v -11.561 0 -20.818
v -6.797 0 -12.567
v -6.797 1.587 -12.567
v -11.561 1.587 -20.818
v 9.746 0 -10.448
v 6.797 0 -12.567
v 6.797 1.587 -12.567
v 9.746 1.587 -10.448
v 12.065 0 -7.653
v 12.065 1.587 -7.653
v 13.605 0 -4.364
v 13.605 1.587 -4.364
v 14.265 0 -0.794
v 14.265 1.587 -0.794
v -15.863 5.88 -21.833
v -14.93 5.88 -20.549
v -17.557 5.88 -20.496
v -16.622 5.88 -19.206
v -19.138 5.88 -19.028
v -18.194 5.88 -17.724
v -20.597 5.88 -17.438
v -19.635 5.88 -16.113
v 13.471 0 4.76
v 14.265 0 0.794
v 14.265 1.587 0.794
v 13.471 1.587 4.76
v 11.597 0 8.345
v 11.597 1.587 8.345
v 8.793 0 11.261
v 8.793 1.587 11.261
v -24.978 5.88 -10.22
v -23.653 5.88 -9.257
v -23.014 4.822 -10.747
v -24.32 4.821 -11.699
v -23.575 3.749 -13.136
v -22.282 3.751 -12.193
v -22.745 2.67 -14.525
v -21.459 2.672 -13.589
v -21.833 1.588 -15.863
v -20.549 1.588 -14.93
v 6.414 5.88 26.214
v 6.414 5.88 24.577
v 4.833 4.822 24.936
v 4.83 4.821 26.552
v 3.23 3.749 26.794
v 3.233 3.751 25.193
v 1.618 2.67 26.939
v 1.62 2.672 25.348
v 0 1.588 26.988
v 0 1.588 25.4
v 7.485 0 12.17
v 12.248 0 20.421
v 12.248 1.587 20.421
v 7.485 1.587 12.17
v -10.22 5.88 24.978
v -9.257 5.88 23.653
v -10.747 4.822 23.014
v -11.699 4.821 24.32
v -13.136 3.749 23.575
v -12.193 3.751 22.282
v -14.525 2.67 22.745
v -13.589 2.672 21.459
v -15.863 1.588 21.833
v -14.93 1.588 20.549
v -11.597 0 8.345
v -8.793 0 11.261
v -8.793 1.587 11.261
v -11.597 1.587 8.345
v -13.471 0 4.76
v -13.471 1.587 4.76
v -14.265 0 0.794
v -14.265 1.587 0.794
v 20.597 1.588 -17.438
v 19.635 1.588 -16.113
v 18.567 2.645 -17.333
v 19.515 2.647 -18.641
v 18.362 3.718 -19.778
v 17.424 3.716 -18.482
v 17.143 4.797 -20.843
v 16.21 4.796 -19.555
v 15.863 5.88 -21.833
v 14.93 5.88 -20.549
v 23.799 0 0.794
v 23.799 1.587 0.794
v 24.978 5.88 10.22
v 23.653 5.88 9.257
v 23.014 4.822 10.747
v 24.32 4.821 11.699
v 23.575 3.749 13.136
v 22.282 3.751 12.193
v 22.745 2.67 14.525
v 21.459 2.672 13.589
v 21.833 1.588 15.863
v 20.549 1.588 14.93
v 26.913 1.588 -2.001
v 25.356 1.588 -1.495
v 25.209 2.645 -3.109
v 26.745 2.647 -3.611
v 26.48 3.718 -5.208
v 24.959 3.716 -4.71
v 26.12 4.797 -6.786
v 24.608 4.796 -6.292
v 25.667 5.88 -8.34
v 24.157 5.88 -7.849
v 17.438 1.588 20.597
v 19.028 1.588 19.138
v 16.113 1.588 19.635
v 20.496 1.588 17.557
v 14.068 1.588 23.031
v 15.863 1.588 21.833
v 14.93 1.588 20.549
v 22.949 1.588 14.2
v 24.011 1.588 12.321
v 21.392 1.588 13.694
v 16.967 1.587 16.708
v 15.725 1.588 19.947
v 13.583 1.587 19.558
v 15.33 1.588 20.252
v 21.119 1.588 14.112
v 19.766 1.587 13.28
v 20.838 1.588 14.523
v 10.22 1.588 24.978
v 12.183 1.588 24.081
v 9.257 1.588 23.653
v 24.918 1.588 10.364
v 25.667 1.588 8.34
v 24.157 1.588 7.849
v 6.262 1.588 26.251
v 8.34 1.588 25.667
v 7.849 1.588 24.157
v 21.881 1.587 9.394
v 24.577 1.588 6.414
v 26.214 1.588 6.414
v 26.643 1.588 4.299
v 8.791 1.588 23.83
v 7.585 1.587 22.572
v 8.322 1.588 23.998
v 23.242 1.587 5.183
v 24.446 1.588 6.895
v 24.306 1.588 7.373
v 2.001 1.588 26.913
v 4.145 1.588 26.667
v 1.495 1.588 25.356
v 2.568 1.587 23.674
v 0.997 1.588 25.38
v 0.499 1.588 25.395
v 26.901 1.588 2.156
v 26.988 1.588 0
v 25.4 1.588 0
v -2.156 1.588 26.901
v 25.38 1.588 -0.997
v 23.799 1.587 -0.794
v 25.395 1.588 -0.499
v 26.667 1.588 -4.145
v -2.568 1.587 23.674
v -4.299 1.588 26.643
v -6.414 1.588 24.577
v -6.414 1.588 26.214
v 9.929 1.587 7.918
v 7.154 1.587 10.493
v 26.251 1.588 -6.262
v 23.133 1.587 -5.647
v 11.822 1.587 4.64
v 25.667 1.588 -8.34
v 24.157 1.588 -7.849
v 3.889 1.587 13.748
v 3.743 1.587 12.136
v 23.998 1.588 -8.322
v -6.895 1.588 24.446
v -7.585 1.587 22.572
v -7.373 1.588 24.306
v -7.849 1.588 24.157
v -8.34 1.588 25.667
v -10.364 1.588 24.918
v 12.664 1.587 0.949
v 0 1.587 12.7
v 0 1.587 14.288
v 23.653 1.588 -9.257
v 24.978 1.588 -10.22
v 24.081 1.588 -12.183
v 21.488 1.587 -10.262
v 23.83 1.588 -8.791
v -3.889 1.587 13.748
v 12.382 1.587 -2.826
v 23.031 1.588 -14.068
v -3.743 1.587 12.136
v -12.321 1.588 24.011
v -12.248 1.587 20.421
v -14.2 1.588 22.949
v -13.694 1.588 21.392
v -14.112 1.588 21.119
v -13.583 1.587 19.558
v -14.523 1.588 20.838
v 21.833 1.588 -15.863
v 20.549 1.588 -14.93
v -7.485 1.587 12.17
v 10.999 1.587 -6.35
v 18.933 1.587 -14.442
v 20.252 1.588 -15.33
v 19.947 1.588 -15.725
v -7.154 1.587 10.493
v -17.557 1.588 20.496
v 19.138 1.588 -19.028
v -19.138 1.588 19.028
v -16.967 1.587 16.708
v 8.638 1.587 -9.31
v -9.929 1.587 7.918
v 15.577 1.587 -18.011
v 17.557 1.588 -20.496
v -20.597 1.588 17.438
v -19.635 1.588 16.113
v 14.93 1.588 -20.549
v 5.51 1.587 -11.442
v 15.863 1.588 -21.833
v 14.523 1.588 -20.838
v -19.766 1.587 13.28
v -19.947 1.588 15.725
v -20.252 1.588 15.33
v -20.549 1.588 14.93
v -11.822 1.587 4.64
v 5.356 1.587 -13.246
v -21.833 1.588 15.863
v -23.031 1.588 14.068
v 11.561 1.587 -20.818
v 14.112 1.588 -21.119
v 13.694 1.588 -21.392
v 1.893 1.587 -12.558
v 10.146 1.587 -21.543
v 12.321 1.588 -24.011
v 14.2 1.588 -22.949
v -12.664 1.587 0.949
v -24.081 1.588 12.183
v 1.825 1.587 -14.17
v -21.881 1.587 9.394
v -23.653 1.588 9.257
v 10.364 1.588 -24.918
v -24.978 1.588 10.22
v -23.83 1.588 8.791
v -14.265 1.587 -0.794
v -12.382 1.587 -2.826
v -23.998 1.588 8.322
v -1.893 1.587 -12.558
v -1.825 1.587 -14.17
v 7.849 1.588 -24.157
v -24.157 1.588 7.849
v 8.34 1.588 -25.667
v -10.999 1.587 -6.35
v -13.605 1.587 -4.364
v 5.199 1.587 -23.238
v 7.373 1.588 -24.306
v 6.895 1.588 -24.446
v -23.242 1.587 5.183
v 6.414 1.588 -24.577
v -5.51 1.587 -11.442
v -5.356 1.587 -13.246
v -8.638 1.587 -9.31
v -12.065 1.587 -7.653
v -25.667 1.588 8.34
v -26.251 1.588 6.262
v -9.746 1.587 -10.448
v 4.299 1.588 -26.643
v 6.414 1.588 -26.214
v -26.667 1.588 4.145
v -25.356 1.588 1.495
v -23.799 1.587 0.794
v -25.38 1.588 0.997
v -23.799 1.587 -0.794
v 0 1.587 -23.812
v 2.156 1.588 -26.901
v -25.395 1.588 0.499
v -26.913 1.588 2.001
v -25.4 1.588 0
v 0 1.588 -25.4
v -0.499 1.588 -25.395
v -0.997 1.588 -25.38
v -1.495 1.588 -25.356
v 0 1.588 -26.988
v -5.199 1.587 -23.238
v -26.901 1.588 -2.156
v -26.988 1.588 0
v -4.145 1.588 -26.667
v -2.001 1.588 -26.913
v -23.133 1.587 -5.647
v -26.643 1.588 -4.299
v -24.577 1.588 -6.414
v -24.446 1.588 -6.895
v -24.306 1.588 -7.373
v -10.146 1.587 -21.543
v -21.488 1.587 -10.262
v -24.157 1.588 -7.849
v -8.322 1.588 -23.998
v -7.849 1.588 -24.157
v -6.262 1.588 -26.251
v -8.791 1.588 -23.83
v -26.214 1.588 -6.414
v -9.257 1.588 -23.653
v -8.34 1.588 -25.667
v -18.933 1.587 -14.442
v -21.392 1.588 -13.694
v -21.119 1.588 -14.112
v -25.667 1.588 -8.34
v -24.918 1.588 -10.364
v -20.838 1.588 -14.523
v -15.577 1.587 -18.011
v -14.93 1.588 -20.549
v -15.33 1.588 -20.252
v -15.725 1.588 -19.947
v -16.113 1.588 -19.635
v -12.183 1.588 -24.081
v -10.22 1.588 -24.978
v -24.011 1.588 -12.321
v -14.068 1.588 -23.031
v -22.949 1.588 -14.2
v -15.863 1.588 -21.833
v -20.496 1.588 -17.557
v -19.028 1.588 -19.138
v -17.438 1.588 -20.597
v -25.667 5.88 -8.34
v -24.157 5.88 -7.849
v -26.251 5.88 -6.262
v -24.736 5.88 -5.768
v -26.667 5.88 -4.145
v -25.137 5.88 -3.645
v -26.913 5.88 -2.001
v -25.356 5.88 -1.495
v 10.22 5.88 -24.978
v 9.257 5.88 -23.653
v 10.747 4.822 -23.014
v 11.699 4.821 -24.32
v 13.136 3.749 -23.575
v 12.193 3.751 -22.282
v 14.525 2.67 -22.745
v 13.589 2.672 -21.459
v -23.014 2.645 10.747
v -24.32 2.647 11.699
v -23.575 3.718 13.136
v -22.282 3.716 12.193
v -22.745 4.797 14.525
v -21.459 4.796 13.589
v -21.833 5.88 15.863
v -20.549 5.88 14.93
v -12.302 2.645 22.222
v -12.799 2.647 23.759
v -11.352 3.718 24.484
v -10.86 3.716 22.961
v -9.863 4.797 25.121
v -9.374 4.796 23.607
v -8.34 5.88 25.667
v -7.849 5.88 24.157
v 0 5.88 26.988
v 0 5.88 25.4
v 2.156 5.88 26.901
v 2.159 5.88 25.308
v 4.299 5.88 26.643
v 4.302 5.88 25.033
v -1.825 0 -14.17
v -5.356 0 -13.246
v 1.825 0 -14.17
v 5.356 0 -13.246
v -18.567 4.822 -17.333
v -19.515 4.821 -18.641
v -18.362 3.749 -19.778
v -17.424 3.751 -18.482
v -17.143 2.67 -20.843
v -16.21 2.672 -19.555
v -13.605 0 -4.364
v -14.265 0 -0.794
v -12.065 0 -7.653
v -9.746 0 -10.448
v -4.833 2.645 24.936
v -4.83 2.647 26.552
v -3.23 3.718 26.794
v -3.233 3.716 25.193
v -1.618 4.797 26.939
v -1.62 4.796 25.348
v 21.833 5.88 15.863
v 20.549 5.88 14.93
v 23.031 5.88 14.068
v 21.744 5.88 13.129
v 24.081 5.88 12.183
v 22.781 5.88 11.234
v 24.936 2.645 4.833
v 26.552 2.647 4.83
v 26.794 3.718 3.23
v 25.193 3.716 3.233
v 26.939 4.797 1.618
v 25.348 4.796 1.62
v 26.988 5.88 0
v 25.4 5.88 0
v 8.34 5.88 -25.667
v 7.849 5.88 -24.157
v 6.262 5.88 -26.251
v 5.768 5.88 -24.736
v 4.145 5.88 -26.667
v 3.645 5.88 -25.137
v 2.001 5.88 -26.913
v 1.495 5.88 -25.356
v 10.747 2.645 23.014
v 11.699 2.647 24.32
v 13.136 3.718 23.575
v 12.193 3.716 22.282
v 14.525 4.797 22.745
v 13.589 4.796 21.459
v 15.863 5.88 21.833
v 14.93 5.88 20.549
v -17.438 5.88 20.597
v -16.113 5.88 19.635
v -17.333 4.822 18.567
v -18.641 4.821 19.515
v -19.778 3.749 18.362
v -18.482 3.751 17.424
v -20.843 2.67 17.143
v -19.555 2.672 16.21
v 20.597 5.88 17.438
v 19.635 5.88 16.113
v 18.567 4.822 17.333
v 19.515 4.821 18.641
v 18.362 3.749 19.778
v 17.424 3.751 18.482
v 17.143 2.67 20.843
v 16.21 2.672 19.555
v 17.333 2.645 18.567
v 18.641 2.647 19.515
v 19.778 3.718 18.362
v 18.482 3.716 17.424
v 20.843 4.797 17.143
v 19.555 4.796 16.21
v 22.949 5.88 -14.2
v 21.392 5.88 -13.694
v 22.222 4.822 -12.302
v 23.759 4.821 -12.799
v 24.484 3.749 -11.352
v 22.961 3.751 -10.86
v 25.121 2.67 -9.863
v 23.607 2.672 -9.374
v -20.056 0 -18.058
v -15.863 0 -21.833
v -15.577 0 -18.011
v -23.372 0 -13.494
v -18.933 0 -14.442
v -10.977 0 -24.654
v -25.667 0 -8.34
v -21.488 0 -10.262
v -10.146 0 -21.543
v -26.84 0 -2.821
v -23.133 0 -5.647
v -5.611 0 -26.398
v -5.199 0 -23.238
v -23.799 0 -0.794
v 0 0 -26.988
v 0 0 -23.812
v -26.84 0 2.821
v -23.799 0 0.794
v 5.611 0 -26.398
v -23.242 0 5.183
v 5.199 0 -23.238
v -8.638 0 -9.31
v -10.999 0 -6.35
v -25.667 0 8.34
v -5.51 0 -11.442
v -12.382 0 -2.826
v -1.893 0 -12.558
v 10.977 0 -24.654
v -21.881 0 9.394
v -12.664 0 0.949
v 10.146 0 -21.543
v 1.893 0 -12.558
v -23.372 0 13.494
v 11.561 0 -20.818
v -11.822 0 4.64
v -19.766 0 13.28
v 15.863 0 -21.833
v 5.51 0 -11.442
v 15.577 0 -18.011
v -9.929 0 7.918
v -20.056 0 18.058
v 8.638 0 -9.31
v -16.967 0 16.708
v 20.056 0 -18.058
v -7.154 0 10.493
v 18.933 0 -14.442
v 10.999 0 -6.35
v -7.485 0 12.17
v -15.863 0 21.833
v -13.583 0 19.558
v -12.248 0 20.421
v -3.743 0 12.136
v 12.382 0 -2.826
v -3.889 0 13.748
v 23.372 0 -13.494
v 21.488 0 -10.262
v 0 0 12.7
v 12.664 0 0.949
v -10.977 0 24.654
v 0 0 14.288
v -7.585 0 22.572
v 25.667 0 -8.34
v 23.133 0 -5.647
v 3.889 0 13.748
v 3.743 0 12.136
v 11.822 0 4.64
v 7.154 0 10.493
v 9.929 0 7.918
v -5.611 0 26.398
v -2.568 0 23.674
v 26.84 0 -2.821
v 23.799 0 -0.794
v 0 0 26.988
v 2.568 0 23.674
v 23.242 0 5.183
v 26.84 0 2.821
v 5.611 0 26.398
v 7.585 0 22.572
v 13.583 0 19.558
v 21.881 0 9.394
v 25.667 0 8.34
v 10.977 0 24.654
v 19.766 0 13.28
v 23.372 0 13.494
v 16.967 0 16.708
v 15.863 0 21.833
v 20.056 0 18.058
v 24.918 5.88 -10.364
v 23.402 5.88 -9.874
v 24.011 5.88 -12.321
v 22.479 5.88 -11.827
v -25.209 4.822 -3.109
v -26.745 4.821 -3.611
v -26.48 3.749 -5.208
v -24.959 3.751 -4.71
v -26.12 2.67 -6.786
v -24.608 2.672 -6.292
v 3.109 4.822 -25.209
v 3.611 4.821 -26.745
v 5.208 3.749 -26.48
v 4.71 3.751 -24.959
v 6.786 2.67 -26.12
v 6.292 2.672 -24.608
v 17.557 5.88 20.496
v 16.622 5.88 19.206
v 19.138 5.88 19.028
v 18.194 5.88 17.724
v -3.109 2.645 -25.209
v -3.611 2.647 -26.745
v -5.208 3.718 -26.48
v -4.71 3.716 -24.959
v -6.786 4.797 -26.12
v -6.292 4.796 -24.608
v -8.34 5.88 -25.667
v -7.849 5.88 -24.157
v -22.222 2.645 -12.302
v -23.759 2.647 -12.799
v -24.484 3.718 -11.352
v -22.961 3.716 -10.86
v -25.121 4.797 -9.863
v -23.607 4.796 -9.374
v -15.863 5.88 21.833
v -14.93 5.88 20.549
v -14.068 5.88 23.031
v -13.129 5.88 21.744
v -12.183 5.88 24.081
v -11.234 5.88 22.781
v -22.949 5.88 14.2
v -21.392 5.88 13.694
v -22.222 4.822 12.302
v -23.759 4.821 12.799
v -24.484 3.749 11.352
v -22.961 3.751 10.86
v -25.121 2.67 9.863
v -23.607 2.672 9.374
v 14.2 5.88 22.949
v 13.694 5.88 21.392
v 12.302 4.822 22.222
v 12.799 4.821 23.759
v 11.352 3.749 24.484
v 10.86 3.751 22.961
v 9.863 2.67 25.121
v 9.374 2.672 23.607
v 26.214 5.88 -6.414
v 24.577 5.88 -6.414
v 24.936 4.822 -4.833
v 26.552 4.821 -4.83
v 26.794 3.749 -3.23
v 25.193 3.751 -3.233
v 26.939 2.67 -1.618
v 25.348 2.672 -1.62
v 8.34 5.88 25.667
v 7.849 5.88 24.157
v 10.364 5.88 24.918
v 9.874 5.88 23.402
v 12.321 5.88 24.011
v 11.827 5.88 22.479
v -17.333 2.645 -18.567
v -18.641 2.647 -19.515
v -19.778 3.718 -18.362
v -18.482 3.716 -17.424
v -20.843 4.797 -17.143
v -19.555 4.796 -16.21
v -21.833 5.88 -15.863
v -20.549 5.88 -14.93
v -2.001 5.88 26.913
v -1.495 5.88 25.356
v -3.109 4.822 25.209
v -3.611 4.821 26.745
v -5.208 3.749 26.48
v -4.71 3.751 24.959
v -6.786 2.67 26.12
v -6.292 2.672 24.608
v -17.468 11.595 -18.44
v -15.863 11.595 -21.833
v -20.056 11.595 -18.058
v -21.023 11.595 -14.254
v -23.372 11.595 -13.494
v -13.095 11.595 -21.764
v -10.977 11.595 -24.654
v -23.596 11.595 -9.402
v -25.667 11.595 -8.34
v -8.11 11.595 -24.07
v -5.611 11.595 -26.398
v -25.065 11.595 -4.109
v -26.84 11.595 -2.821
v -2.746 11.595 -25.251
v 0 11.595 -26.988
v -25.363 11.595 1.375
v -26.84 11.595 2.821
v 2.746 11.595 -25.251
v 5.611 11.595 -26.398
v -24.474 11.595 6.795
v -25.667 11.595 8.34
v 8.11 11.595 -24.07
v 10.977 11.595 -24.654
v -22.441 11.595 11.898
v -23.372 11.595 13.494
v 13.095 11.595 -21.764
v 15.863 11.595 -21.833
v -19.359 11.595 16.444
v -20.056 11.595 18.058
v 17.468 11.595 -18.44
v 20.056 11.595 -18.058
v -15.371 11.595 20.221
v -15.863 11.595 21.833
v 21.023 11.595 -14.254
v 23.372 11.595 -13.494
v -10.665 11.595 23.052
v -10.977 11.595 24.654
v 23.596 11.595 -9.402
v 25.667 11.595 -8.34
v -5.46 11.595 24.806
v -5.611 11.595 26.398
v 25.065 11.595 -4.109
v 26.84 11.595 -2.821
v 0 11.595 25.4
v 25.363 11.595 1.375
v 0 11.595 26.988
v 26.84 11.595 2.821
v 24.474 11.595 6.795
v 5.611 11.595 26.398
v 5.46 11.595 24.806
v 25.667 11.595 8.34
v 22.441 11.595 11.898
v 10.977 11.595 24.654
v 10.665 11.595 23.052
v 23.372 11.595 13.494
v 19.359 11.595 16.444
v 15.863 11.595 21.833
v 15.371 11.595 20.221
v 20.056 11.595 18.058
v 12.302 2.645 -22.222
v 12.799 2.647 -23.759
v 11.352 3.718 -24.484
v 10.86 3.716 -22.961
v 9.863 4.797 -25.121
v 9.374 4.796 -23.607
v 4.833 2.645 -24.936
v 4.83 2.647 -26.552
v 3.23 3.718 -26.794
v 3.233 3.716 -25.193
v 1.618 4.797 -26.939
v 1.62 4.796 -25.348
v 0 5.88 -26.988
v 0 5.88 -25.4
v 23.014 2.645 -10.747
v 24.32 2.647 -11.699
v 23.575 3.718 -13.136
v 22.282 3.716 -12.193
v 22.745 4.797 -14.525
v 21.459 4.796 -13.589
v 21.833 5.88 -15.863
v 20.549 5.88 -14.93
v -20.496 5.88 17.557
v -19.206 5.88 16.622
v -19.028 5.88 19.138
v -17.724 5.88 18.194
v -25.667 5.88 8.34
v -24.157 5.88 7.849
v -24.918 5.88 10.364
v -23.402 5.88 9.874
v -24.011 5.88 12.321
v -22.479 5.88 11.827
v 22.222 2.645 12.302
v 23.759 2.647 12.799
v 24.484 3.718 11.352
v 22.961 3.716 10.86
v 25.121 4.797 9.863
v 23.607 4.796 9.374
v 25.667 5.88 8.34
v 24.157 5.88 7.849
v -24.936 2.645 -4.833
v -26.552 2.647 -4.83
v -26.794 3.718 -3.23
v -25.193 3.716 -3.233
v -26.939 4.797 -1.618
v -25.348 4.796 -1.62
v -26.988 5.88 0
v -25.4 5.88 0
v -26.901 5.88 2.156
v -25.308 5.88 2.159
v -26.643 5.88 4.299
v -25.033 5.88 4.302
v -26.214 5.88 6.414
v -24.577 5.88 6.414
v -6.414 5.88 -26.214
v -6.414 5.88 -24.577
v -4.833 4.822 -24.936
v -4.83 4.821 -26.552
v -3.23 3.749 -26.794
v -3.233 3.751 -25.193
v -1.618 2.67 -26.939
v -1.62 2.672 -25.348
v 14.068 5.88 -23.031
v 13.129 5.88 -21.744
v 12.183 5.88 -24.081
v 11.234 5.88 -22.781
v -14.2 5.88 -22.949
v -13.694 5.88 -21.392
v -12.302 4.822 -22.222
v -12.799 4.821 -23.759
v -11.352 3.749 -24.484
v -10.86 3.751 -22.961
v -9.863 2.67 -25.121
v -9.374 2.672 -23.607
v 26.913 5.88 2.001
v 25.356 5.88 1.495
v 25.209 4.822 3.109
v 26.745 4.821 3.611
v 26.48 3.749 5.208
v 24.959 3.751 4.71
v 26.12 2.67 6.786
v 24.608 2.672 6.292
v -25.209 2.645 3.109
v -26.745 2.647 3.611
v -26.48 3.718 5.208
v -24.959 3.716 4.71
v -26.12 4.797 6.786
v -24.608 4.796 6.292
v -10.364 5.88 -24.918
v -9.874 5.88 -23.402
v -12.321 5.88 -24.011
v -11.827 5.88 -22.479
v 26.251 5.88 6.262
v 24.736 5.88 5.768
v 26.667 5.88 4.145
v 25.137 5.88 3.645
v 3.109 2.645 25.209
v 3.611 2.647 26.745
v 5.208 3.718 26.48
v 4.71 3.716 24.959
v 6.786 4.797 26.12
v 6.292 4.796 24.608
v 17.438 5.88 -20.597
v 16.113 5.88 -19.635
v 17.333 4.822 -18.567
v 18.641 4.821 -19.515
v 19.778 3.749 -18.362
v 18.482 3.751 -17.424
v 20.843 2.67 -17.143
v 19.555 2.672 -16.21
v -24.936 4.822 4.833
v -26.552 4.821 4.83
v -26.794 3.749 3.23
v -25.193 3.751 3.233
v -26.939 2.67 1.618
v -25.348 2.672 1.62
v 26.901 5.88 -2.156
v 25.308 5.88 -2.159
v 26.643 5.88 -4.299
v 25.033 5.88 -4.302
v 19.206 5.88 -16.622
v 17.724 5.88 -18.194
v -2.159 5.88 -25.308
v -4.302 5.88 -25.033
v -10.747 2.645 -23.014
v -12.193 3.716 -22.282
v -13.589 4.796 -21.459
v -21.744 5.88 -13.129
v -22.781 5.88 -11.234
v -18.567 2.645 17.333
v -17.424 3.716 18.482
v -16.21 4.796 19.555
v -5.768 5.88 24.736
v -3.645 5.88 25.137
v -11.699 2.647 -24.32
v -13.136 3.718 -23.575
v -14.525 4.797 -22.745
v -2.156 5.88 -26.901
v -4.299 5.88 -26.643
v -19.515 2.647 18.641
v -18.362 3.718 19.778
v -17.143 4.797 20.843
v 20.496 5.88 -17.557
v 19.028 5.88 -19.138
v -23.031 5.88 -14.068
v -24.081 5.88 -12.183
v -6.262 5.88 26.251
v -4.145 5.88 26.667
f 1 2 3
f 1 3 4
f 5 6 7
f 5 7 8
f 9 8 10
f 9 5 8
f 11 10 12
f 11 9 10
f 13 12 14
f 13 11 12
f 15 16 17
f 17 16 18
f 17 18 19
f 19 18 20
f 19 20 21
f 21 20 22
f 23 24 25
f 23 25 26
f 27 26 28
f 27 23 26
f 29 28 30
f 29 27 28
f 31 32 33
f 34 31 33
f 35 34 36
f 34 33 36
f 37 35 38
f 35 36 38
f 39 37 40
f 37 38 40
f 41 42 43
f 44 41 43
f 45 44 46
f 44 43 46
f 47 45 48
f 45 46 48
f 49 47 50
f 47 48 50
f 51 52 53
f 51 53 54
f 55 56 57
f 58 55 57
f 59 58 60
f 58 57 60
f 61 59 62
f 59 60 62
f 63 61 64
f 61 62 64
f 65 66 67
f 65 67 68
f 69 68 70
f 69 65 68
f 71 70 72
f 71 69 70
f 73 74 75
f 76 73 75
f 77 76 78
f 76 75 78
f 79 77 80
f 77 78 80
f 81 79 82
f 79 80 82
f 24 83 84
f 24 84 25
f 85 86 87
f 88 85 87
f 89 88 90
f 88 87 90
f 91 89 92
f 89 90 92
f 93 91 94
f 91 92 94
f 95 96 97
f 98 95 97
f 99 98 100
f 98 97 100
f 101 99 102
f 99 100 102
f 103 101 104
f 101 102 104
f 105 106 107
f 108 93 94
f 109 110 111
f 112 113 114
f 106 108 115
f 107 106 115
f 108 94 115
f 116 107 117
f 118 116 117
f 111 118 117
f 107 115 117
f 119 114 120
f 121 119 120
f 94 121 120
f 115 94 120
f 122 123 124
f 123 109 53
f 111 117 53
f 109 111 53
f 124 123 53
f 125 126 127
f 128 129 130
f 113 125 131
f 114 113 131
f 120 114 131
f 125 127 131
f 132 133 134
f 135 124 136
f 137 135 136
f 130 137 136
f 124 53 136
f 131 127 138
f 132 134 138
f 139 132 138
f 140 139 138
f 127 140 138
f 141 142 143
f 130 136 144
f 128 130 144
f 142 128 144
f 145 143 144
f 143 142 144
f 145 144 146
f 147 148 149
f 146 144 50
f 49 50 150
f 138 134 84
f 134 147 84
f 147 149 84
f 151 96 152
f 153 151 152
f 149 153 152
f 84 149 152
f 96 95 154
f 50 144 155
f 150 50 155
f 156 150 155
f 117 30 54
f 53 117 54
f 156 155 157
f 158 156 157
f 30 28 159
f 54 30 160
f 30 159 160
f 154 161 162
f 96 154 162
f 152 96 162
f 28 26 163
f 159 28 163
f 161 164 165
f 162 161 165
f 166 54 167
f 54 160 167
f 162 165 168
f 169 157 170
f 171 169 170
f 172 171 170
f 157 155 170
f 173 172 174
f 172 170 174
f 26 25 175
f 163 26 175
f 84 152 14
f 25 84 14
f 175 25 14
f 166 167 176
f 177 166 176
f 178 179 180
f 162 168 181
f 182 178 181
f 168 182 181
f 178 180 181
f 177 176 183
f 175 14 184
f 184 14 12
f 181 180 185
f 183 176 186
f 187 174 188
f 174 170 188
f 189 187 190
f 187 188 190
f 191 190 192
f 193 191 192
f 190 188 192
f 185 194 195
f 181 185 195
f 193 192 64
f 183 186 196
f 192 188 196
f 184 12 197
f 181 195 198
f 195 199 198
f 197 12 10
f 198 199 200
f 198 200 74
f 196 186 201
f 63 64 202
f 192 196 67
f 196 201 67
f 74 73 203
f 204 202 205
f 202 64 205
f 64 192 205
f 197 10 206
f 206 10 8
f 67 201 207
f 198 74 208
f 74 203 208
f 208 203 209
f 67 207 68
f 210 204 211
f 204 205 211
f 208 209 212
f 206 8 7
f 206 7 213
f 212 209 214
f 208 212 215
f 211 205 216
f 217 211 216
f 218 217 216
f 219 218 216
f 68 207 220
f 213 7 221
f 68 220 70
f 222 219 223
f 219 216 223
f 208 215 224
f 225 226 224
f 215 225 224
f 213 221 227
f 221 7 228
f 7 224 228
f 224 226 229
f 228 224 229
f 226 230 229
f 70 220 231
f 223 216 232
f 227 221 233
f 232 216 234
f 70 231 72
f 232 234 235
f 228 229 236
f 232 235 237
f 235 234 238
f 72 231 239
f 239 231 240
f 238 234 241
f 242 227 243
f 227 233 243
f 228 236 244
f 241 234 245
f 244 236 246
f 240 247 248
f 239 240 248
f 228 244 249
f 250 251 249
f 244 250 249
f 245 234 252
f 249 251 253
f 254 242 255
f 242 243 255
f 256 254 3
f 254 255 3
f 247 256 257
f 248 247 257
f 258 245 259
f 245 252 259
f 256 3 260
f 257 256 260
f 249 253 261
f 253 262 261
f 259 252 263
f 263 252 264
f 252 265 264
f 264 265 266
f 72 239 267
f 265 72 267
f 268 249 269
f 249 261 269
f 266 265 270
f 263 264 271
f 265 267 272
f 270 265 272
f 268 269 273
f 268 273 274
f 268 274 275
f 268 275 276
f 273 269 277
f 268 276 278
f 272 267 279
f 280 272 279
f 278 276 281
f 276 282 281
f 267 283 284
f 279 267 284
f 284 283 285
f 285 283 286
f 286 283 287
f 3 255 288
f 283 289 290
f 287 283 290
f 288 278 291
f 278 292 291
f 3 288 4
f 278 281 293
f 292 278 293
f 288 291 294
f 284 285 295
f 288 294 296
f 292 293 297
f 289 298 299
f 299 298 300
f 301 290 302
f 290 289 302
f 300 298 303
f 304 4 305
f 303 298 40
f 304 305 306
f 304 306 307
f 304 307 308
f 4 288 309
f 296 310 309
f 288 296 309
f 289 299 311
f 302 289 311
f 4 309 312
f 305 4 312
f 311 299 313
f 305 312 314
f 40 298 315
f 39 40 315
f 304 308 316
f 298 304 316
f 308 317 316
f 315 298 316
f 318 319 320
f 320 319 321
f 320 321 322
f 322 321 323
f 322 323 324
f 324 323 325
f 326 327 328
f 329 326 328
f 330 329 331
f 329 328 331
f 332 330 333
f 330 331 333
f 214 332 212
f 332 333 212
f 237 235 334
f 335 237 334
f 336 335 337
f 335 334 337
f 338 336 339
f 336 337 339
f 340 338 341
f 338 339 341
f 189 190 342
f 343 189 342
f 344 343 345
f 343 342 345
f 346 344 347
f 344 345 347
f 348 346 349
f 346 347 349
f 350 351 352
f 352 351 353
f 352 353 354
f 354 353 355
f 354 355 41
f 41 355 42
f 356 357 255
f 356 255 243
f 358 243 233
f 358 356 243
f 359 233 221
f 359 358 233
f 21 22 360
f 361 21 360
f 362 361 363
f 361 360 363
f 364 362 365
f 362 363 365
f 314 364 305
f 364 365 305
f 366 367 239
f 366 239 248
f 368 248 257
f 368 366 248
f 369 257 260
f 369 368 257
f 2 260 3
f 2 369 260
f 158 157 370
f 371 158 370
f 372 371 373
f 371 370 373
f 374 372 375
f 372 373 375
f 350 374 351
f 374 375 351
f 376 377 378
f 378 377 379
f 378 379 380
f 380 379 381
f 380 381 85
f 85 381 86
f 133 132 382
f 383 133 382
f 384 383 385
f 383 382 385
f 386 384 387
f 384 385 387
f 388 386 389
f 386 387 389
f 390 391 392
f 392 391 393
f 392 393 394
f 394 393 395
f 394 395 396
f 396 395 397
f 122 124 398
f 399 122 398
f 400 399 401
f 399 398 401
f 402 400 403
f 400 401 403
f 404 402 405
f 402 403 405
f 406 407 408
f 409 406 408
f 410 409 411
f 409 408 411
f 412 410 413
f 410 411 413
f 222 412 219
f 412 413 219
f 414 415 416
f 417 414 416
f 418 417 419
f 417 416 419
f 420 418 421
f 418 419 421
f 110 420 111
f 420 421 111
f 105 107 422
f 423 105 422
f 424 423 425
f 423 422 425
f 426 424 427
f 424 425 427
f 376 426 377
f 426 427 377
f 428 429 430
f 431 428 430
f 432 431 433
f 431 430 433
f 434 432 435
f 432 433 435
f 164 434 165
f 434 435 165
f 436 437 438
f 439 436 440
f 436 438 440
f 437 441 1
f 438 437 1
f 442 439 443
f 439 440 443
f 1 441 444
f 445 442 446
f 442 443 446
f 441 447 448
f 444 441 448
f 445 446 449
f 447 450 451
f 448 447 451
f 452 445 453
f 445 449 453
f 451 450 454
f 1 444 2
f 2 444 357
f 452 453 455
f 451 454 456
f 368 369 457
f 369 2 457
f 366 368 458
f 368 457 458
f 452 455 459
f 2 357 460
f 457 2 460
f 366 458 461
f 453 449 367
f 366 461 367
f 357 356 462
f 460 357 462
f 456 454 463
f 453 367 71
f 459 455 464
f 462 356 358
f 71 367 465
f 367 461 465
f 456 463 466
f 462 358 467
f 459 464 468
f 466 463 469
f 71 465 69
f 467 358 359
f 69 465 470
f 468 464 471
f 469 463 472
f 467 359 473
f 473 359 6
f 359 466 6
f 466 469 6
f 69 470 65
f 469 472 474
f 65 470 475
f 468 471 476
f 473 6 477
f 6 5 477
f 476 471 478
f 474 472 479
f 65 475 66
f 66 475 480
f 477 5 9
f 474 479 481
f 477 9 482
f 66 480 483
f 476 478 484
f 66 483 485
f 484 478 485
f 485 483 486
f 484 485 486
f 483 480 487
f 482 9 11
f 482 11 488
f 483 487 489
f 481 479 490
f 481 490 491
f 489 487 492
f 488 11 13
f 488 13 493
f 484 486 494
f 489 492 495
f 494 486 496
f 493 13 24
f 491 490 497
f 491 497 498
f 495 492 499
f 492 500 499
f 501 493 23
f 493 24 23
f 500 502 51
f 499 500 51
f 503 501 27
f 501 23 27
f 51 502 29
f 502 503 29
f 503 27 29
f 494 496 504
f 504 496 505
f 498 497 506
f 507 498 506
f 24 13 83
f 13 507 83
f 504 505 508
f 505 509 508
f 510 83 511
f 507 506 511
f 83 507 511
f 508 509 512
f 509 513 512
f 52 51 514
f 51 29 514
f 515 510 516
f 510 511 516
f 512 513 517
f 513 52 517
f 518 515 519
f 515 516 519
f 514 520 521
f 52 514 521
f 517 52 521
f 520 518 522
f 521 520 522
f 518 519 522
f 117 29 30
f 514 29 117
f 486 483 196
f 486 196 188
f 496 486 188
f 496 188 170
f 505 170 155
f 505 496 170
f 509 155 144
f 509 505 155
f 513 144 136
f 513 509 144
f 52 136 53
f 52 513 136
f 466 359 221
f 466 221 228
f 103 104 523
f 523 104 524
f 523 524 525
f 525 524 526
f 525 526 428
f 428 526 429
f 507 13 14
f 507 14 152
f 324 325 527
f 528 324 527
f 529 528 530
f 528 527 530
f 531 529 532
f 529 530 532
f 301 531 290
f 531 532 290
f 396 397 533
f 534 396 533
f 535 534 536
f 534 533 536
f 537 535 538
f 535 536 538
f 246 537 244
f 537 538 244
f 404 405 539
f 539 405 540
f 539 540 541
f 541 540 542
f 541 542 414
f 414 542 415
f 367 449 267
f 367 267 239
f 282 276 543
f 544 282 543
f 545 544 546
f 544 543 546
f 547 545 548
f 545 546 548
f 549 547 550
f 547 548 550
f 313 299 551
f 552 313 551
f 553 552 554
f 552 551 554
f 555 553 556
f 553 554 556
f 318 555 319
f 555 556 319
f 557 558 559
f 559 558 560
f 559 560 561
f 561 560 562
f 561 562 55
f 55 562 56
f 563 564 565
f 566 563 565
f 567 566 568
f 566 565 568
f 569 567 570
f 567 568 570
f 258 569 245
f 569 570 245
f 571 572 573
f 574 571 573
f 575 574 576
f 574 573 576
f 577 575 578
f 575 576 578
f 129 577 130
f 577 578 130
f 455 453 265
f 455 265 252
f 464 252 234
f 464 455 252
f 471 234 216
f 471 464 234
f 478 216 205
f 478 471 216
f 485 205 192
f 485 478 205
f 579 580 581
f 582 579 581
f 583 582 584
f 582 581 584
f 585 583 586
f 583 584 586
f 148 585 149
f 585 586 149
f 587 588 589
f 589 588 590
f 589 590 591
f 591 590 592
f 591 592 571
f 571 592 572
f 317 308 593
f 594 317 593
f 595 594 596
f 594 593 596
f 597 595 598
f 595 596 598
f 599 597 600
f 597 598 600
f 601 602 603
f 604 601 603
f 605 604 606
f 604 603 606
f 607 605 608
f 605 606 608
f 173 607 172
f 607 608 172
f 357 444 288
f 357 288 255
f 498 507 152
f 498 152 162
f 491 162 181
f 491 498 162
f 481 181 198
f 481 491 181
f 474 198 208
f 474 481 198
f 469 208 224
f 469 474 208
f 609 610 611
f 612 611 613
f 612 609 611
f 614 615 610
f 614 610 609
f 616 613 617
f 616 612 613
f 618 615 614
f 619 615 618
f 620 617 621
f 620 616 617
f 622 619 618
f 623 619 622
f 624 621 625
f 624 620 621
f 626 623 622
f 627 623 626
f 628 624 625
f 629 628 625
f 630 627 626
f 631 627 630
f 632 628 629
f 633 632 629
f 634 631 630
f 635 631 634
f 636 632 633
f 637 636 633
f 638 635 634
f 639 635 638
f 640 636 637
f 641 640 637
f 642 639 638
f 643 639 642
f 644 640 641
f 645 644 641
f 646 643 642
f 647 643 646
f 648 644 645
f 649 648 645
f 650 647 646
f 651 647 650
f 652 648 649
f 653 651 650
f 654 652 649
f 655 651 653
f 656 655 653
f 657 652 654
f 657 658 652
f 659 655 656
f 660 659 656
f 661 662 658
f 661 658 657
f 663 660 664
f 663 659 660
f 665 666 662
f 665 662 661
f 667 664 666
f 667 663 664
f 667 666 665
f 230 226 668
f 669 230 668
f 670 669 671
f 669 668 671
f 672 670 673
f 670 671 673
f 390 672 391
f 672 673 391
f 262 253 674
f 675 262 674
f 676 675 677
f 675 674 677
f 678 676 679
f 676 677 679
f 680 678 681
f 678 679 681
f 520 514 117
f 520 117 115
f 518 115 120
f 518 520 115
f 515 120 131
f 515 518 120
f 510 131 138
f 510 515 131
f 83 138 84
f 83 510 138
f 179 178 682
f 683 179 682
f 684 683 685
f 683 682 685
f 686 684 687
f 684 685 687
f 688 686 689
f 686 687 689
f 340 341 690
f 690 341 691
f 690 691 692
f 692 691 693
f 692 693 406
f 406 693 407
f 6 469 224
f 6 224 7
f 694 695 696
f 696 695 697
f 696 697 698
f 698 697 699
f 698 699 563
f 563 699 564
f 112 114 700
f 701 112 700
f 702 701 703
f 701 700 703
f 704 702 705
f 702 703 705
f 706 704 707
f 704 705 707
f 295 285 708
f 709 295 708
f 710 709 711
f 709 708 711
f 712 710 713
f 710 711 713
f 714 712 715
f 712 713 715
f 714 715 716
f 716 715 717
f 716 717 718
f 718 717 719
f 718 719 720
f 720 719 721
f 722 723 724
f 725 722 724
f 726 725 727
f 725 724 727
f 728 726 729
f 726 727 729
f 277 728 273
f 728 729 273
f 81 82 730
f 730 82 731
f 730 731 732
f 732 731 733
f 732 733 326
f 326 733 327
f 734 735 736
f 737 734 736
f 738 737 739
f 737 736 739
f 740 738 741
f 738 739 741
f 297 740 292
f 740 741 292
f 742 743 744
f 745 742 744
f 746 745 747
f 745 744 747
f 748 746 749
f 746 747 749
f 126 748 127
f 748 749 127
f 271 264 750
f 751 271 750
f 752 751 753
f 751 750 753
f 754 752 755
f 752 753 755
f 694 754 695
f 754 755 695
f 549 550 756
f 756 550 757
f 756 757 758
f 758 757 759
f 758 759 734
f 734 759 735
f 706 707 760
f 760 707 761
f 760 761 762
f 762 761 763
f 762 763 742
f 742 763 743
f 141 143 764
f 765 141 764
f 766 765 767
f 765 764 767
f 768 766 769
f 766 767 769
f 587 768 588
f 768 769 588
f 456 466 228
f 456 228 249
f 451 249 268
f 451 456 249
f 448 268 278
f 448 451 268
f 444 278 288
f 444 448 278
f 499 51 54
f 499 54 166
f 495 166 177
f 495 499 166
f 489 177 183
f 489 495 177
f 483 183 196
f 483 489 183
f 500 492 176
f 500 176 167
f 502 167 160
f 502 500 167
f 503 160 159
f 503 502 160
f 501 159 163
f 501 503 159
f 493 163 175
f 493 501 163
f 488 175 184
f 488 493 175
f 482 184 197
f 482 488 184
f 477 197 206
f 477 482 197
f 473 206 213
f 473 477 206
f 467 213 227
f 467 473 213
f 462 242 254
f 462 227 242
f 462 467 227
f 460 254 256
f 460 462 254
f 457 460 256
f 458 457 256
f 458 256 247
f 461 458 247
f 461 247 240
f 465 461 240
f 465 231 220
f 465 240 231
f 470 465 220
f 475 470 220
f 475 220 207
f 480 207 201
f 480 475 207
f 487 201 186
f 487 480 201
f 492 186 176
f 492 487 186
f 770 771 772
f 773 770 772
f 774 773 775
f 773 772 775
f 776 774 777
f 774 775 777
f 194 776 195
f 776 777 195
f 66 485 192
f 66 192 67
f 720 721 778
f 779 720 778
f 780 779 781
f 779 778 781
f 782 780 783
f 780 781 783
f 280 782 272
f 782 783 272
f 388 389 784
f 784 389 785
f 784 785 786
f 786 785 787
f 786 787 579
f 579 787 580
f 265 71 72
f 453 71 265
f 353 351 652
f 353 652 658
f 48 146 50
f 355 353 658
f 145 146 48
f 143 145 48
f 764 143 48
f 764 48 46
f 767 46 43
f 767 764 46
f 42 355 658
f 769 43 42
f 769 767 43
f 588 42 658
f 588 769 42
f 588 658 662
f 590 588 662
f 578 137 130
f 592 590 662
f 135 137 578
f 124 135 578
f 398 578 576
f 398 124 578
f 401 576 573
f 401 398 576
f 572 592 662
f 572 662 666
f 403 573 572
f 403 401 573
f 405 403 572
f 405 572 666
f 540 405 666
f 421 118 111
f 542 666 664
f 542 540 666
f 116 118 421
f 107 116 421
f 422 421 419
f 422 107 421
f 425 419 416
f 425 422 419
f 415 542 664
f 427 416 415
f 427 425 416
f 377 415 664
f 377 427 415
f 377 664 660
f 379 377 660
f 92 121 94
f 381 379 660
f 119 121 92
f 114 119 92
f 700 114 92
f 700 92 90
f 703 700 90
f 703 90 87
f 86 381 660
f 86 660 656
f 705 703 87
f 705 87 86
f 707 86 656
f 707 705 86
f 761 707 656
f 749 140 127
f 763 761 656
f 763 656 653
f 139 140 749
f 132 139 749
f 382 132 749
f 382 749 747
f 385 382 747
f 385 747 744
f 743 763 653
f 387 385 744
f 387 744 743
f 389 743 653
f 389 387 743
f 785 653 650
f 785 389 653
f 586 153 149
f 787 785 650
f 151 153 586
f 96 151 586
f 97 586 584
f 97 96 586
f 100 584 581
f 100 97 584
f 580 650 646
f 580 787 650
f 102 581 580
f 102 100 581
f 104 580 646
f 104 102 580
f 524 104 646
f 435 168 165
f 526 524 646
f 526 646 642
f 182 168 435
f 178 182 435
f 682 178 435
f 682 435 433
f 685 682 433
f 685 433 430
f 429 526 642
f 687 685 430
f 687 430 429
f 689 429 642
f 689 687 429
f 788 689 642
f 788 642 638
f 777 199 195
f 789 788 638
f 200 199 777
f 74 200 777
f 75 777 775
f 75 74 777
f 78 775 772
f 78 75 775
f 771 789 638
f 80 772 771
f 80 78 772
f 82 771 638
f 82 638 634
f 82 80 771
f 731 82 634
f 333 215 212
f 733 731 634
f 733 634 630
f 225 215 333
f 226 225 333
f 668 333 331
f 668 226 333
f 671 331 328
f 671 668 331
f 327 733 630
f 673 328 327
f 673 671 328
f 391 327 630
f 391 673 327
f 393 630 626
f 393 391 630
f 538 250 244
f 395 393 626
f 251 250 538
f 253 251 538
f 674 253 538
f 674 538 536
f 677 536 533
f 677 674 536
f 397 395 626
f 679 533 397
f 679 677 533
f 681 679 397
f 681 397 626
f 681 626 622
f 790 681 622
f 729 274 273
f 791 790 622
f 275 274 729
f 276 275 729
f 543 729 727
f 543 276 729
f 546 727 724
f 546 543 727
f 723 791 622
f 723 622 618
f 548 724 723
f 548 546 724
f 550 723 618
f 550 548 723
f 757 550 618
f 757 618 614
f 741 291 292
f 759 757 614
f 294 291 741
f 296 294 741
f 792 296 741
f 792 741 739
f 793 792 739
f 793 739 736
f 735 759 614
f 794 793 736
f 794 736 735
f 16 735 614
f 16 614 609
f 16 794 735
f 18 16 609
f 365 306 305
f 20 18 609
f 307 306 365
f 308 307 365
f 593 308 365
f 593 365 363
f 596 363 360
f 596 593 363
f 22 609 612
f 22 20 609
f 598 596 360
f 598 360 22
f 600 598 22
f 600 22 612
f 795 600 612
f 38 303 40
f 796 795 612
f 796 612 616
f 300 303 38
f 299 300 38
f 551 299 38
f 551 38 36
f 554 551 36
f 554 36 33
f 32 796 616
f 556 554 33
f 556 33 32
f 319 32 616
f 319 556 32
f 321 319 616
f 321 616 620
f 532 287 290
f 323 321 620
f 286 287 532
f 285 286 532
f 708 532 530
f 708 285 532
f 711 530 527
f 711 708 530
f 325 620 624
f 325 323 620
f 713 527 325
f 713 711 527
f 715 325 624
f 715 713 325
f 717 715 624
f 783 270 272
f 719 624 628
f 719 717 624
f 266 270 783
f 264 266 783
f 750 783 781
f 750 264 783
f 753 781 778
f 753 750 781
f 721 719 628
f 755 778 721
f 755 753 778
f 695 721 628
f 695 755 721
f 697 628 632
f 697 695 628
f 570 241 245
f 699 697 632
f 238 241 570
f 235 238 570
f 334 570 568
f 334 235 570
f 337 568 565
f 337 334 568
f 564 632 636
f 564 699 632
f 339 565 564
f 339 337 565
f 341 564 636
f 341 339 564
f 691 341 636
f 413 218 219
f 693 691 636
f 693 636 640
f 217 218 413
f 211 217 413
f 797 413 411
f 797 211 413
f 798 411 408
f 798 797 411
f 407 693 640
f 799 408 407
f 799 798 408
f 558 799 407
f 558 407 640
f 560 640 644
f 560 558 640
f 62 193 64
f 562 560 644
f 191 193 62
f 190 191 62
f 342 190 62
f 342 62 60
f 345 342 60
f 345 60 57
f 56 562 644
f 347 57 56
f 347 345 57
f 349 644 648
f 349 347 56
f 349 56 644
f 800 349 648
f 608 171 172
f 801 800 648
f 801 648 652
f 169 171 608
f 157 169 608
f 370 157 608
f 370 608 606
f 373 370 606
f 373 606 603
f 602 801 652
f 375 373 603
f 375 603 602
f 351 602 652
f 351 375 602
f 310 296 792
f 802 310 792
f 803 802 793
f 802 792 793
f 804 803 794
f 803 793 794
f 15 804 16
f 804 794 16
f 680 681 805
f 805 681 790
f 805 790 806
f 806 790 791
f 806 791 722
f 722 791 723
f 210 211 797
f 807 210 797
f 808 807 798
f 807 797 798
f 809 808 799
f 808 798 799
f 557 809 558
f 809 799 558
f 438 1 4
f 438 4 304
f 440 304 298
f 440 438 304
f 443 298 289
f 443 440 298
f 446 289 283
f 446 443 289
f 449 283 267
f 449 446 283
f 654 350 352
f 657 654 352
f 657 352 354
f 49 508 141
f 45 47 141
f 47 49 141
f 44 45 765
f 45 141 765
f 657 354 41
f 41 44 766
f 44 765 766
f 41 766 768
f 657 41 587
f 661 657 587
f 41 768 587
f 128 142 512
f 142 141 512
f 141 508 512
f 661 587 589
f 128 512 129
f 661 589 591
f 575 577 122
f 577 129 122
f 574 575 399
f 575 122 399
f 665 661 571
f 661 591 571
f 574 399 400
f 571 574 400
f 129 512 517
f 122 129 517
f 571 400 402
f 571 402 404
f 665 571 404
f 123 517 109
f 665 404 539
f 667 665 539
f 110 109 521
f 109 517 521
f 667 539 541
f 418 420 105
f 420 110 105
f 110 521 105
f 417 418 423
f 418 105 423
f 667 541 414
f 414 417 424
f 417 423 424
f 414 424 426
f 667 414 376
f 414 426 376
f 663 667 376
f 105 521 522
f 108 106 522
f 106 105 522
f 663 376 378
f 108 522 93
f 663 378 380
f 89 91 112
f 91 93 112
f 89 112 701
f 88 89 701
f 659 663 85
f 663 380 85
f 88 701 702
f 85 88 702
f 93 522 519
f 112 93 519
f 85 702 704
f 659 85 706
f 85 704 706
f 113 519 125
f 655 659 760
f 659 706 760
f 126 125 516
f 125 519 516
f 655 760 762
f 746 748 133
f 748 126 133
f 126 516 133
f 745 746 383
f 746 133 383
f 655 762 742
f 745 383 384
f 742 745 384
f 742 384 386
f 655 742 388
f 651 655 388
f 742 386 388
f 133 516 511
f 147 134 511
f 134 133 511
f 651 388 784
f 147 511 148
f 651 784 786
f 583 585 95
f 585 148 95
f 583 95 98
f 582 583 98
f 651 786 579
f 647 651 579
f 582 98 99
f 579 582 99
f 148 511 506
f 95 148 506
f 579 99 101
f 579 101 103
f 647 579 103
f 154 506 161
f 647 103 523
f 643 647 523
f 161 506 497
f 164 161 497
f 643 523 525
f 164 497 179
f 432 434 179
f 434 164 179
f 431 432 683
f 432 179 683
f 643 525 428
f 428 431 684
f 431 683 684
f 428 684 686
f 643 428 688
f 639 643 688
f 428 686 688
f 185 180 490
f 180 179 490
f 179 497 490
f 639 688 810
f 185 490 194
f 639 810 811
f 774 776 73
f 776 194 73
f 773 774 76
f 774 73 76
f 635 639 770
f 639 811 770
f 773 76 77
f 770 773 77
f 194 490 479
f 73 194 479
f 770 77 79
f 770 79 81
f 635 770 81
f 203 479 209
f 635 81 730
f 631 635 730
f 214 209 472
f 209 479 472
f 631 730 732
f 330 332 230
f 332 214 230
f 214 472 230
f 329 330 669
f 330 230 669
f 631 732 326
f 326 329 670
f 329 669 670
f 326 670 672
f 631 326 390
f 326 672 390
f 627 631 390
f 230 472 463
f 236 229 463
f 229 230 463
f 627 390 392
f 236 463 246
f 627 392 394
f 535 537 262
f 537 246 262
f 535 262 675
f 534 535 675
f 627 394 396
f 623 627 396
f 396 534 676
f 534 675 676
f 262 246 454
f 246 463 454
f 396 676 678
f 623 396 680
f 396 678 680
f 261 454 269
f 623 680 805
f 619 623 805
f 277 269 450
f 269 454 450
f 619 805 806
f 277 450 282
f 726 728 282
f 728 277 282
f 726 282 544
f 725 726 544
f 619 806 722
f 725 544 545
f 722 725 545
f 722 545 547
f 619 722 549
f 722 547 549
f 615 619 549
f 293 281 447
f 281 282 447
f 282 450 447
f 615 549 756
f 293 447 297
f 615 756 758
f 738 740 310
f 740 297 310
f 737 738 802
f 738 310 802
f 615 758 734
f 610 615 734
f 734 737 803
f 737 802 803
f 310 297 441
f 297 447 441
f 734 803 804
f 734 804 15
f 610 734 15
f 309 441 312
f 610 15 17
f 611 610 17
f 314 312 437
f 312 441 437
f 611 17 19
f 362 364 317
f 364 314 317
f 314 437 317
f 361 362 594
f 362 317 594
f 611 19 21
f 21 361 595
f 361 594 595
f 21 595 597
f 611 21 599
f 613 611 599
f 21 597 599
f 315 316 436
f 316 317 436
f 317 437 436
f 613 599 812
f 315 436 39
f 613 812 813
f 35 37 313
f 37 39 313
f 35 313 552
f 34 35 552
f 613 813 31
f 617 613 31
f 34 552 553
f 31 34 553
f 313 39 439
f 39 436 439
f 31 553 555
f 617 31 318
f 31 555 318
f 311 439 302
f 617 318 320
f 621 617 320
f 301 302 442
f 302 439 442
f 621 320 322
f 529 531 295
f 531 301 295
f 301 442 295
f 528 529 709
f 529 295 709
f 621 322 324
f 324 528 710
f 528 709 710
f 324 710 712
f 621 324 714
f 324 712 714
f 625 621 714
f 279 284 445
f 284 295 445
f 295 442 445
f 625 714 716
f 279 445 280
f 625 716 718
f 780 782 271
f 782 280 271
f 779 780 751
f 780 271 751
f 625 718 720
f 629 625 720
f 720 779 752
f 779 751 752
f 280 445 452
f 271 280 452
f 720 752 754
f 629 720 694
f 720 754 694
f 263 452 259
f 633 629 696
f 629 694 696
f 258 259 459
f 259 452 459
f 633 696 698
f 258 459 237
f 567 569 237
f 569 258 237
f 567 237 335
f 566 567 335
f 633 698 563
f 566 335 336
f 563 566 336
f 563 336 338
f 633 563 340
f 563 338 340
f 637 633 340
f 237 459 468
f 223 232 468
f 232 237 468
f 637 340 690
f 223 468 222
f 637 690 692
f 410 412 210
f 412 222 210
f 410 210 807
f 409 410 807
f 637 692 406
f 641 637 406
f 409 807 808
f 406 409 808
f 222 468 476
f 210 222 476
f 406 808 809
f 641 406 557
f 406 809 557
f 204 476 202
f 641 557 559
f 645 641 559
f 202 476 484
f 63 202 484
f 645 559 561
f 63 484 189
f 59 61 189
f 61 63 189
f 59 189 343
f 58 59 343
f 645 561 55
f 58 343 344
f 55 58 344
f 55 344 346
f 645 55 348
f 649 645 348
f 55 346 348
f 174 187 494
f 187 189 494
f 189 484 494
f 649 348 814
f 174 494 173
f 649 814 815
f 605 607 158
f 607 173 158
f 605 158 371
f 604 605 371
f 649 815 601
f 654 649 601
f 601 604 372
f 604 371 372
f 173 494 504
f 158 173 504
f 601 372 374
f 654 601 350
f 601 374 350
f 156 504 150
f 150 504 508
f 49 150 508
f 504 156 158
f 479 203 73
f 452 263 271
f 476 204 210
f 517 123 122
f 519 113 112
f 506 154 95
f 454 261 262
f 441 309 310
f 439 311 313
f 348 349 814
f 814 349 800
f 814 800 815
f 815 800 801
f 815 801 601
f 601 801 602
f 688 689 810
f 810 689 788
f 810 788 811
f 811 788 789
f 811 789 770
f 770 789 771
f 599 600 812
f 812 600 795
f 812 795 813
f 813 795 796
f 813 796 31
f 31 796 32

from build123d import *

# Parameters (mm, degrees)
SKETCH2_R               = 26.9875
BOSS_EXTRUDE1_DEPTH     = 11.5951
SHELL1_T                = -1.5875
CUT_EXTRUDE1_DEPTH      = 40.456334983
CUT_EXTRUDE1_DEPTH_BACK = 40.456334983
SKETCH5_R               = 12.7
CUT_EXTRUDE2_DEPTH      = 38.1
CIRPATTERN3_COUNT       = 20
CUT_EXTRUDE3_DEPTH      = 40.456334983
CUT_EXTRUDE3_DEPTH_BACK = 40.456334983


with BuildPart() as part:
    # Sketch2 → Boss-Extrude1 (new body)
    with BuildSketch(Plane(origin=(0, 0, 0), x_dir=(1, 0, 0), z_dir=(0, 1, 0))):
        Circle(SKETCH2_R)
    extrude(amount=BOSS_EXTRUDE1_DEPTH)

    # Shell1
    shell1_openings = [part.faces().sort_by_distance(p)[0] for p in [
        (0, 11.5951, 0),
    ]]
    offset(amount=SHELL1_T, openings=shell1_openings, kind=Kind.INTERSECTION)

    # Sketch5 → Cut-Extrude1 (cut, two sides: drawn at the far end of the back side and taken through both)
    with BuildSketch(Plane(origin=(0, 1.5875, 0), x_dir=(1, 0, 0), z_dir=(0, 1, 0)).offset(-CUT_EXTRUDE1_DEPTH_BACK)):
        Circle(SKETCH5_R)
    extrude(amount=CUT_EXTRUDE1_DEPTH + CUT_EXTRUDE1_DEPTH_BACK, mode=Mode.SUBTRACT)

    # Sketch6 → Cut-Extrude2 (cut)
    with BuildSketch(Plane.XY):
        Polygon((6.413577678, 1.5875), (0, 5.8801), (-6.413577678, 5.8801), (0, 1.5875), align=None)
    cut_extrude2 = extrude(amount=-CUT_EXTRUDE2_DEPTH, mode=Mode.SUBTRACT)

    # CirPattern3: Cut-Extrude2 ×20 about axis
    cirpattern3_axis = Axis((0, 11.5951, 0), (0, -1, 0))
    for i in range(1, CIRPATTERN3_COUNT):
        add(cut_extrude2.rotate(cirpattern3_axis, i * 360 / CIRPATTERN3_COUNT), mode=Mode.SUBTRACT)

    # Sketch7 → Cut-Extrude3 (cut, two sides: drawn at the far end of the back side and taken through both)
    with BuildSketch(Plane(origin=(0, 1.5875, 0), x_dir=(1, 0, 0), z_dir=(0, 1, 0)).offset(-CUT_EXTRUDE3_DEPTH_BACK)):
        with BuildLine():
            ThreePointArc((-23.799267157, -0.79375), (-20.913926743, -11.386080292), (-13.583355992, -19.558312715))
            Line((-13.583355992, -19.558312715), (-8.793031725, -11.261227701))
            ThreePointArc((-8.793031725, -11.261227701), (-12.661565337, -6.619472748), (-14.26543435, -0.79375))
            Line((-14.26543435, -0.79375), (-23.799267157, -0.79375))
        make_face()
        with BuildLine():
            Line((-7.484697224, -12.170125871), (-12.248300071, -20.42092803))
            ThreePointArc((-12.248300071, -20.42092803), (0, -23.8125), (12.248300071, -20.42092803))
            Line((12.248300071, -20.42092803), (7.484697224, -12.170125871))
            ThreePointArc((7.484697224, -12.170125871), (0, -14.2875), (-7.484697224, -12.170125871))
        make_face()
        with BuildLine():
            ThreePointArc((-11.560892407, 20.81780303), (-20.318117433, 12.418102118), (-23.799267157, 0.79375))
            Line((-23.799267157, 0.79375), (-14.26543435, 0.79375))
            ThreePointArc((-14.26543435, 0.79375), (-12.064905455, 7.653150502), (-6.79728956, 12.567000871))
            Line((-6.79728956, 12.567000871), (-11.560892407, 20.81780303))
        make_face()
        with BuildLine():
            Line((8.793031725, -11.261227701), (13.583355992, -19.558312715))
            ThreePointArc((13.583355992, -19.558312715), (20.913926743, -11.386080292), (23.799267157, -0.79375))
            Line((23.799267157, -0.79375), (14.26543435, -0.79375))
            ThreePointArc((14.26543435, -0.79375), (12.661565337, -6.619472748), (8.793031725, -11.261227701))
        make_face()
        with BuildLine():
            ThreePointArc((10.14631767, 21.542687715), (0, 23.8125), (-10.14631767, 21.542687715))
            Line((-10.14631767, 21.542687715), (-5.355993404, 13.245602701))
            ThreePointArc((-5.355993404, 13.245602701), (0, 14.2875), (5.355993404, 13.245602701))
            Line((5.355993404, 13.245602701), (10.14631767, 21.542687715))
        make_face()
        with BuildLine():
            ThreePointArc((6.79728956, 12.567000871), (12.064905455, 7.653150502), (14.26543435, 0.79375))
            Line((14.26543435, 0.79375), (23.799267157, 0.79375))
            ThreePointArc((23.799267157, 0.79375), (20.318117433, 12.418102118), (11.560892407, 20.81780303))
            Line((11.560892407, 20.81780303), (6.79728956, 12.567000871))
        make_face()
    extrude(amount=CUT_EXTRUDE3_DEPTH + CUT_EXTRUDE3_DEPTH_BACK, mode=Mode.SUBTRACT)


solid = part.part
